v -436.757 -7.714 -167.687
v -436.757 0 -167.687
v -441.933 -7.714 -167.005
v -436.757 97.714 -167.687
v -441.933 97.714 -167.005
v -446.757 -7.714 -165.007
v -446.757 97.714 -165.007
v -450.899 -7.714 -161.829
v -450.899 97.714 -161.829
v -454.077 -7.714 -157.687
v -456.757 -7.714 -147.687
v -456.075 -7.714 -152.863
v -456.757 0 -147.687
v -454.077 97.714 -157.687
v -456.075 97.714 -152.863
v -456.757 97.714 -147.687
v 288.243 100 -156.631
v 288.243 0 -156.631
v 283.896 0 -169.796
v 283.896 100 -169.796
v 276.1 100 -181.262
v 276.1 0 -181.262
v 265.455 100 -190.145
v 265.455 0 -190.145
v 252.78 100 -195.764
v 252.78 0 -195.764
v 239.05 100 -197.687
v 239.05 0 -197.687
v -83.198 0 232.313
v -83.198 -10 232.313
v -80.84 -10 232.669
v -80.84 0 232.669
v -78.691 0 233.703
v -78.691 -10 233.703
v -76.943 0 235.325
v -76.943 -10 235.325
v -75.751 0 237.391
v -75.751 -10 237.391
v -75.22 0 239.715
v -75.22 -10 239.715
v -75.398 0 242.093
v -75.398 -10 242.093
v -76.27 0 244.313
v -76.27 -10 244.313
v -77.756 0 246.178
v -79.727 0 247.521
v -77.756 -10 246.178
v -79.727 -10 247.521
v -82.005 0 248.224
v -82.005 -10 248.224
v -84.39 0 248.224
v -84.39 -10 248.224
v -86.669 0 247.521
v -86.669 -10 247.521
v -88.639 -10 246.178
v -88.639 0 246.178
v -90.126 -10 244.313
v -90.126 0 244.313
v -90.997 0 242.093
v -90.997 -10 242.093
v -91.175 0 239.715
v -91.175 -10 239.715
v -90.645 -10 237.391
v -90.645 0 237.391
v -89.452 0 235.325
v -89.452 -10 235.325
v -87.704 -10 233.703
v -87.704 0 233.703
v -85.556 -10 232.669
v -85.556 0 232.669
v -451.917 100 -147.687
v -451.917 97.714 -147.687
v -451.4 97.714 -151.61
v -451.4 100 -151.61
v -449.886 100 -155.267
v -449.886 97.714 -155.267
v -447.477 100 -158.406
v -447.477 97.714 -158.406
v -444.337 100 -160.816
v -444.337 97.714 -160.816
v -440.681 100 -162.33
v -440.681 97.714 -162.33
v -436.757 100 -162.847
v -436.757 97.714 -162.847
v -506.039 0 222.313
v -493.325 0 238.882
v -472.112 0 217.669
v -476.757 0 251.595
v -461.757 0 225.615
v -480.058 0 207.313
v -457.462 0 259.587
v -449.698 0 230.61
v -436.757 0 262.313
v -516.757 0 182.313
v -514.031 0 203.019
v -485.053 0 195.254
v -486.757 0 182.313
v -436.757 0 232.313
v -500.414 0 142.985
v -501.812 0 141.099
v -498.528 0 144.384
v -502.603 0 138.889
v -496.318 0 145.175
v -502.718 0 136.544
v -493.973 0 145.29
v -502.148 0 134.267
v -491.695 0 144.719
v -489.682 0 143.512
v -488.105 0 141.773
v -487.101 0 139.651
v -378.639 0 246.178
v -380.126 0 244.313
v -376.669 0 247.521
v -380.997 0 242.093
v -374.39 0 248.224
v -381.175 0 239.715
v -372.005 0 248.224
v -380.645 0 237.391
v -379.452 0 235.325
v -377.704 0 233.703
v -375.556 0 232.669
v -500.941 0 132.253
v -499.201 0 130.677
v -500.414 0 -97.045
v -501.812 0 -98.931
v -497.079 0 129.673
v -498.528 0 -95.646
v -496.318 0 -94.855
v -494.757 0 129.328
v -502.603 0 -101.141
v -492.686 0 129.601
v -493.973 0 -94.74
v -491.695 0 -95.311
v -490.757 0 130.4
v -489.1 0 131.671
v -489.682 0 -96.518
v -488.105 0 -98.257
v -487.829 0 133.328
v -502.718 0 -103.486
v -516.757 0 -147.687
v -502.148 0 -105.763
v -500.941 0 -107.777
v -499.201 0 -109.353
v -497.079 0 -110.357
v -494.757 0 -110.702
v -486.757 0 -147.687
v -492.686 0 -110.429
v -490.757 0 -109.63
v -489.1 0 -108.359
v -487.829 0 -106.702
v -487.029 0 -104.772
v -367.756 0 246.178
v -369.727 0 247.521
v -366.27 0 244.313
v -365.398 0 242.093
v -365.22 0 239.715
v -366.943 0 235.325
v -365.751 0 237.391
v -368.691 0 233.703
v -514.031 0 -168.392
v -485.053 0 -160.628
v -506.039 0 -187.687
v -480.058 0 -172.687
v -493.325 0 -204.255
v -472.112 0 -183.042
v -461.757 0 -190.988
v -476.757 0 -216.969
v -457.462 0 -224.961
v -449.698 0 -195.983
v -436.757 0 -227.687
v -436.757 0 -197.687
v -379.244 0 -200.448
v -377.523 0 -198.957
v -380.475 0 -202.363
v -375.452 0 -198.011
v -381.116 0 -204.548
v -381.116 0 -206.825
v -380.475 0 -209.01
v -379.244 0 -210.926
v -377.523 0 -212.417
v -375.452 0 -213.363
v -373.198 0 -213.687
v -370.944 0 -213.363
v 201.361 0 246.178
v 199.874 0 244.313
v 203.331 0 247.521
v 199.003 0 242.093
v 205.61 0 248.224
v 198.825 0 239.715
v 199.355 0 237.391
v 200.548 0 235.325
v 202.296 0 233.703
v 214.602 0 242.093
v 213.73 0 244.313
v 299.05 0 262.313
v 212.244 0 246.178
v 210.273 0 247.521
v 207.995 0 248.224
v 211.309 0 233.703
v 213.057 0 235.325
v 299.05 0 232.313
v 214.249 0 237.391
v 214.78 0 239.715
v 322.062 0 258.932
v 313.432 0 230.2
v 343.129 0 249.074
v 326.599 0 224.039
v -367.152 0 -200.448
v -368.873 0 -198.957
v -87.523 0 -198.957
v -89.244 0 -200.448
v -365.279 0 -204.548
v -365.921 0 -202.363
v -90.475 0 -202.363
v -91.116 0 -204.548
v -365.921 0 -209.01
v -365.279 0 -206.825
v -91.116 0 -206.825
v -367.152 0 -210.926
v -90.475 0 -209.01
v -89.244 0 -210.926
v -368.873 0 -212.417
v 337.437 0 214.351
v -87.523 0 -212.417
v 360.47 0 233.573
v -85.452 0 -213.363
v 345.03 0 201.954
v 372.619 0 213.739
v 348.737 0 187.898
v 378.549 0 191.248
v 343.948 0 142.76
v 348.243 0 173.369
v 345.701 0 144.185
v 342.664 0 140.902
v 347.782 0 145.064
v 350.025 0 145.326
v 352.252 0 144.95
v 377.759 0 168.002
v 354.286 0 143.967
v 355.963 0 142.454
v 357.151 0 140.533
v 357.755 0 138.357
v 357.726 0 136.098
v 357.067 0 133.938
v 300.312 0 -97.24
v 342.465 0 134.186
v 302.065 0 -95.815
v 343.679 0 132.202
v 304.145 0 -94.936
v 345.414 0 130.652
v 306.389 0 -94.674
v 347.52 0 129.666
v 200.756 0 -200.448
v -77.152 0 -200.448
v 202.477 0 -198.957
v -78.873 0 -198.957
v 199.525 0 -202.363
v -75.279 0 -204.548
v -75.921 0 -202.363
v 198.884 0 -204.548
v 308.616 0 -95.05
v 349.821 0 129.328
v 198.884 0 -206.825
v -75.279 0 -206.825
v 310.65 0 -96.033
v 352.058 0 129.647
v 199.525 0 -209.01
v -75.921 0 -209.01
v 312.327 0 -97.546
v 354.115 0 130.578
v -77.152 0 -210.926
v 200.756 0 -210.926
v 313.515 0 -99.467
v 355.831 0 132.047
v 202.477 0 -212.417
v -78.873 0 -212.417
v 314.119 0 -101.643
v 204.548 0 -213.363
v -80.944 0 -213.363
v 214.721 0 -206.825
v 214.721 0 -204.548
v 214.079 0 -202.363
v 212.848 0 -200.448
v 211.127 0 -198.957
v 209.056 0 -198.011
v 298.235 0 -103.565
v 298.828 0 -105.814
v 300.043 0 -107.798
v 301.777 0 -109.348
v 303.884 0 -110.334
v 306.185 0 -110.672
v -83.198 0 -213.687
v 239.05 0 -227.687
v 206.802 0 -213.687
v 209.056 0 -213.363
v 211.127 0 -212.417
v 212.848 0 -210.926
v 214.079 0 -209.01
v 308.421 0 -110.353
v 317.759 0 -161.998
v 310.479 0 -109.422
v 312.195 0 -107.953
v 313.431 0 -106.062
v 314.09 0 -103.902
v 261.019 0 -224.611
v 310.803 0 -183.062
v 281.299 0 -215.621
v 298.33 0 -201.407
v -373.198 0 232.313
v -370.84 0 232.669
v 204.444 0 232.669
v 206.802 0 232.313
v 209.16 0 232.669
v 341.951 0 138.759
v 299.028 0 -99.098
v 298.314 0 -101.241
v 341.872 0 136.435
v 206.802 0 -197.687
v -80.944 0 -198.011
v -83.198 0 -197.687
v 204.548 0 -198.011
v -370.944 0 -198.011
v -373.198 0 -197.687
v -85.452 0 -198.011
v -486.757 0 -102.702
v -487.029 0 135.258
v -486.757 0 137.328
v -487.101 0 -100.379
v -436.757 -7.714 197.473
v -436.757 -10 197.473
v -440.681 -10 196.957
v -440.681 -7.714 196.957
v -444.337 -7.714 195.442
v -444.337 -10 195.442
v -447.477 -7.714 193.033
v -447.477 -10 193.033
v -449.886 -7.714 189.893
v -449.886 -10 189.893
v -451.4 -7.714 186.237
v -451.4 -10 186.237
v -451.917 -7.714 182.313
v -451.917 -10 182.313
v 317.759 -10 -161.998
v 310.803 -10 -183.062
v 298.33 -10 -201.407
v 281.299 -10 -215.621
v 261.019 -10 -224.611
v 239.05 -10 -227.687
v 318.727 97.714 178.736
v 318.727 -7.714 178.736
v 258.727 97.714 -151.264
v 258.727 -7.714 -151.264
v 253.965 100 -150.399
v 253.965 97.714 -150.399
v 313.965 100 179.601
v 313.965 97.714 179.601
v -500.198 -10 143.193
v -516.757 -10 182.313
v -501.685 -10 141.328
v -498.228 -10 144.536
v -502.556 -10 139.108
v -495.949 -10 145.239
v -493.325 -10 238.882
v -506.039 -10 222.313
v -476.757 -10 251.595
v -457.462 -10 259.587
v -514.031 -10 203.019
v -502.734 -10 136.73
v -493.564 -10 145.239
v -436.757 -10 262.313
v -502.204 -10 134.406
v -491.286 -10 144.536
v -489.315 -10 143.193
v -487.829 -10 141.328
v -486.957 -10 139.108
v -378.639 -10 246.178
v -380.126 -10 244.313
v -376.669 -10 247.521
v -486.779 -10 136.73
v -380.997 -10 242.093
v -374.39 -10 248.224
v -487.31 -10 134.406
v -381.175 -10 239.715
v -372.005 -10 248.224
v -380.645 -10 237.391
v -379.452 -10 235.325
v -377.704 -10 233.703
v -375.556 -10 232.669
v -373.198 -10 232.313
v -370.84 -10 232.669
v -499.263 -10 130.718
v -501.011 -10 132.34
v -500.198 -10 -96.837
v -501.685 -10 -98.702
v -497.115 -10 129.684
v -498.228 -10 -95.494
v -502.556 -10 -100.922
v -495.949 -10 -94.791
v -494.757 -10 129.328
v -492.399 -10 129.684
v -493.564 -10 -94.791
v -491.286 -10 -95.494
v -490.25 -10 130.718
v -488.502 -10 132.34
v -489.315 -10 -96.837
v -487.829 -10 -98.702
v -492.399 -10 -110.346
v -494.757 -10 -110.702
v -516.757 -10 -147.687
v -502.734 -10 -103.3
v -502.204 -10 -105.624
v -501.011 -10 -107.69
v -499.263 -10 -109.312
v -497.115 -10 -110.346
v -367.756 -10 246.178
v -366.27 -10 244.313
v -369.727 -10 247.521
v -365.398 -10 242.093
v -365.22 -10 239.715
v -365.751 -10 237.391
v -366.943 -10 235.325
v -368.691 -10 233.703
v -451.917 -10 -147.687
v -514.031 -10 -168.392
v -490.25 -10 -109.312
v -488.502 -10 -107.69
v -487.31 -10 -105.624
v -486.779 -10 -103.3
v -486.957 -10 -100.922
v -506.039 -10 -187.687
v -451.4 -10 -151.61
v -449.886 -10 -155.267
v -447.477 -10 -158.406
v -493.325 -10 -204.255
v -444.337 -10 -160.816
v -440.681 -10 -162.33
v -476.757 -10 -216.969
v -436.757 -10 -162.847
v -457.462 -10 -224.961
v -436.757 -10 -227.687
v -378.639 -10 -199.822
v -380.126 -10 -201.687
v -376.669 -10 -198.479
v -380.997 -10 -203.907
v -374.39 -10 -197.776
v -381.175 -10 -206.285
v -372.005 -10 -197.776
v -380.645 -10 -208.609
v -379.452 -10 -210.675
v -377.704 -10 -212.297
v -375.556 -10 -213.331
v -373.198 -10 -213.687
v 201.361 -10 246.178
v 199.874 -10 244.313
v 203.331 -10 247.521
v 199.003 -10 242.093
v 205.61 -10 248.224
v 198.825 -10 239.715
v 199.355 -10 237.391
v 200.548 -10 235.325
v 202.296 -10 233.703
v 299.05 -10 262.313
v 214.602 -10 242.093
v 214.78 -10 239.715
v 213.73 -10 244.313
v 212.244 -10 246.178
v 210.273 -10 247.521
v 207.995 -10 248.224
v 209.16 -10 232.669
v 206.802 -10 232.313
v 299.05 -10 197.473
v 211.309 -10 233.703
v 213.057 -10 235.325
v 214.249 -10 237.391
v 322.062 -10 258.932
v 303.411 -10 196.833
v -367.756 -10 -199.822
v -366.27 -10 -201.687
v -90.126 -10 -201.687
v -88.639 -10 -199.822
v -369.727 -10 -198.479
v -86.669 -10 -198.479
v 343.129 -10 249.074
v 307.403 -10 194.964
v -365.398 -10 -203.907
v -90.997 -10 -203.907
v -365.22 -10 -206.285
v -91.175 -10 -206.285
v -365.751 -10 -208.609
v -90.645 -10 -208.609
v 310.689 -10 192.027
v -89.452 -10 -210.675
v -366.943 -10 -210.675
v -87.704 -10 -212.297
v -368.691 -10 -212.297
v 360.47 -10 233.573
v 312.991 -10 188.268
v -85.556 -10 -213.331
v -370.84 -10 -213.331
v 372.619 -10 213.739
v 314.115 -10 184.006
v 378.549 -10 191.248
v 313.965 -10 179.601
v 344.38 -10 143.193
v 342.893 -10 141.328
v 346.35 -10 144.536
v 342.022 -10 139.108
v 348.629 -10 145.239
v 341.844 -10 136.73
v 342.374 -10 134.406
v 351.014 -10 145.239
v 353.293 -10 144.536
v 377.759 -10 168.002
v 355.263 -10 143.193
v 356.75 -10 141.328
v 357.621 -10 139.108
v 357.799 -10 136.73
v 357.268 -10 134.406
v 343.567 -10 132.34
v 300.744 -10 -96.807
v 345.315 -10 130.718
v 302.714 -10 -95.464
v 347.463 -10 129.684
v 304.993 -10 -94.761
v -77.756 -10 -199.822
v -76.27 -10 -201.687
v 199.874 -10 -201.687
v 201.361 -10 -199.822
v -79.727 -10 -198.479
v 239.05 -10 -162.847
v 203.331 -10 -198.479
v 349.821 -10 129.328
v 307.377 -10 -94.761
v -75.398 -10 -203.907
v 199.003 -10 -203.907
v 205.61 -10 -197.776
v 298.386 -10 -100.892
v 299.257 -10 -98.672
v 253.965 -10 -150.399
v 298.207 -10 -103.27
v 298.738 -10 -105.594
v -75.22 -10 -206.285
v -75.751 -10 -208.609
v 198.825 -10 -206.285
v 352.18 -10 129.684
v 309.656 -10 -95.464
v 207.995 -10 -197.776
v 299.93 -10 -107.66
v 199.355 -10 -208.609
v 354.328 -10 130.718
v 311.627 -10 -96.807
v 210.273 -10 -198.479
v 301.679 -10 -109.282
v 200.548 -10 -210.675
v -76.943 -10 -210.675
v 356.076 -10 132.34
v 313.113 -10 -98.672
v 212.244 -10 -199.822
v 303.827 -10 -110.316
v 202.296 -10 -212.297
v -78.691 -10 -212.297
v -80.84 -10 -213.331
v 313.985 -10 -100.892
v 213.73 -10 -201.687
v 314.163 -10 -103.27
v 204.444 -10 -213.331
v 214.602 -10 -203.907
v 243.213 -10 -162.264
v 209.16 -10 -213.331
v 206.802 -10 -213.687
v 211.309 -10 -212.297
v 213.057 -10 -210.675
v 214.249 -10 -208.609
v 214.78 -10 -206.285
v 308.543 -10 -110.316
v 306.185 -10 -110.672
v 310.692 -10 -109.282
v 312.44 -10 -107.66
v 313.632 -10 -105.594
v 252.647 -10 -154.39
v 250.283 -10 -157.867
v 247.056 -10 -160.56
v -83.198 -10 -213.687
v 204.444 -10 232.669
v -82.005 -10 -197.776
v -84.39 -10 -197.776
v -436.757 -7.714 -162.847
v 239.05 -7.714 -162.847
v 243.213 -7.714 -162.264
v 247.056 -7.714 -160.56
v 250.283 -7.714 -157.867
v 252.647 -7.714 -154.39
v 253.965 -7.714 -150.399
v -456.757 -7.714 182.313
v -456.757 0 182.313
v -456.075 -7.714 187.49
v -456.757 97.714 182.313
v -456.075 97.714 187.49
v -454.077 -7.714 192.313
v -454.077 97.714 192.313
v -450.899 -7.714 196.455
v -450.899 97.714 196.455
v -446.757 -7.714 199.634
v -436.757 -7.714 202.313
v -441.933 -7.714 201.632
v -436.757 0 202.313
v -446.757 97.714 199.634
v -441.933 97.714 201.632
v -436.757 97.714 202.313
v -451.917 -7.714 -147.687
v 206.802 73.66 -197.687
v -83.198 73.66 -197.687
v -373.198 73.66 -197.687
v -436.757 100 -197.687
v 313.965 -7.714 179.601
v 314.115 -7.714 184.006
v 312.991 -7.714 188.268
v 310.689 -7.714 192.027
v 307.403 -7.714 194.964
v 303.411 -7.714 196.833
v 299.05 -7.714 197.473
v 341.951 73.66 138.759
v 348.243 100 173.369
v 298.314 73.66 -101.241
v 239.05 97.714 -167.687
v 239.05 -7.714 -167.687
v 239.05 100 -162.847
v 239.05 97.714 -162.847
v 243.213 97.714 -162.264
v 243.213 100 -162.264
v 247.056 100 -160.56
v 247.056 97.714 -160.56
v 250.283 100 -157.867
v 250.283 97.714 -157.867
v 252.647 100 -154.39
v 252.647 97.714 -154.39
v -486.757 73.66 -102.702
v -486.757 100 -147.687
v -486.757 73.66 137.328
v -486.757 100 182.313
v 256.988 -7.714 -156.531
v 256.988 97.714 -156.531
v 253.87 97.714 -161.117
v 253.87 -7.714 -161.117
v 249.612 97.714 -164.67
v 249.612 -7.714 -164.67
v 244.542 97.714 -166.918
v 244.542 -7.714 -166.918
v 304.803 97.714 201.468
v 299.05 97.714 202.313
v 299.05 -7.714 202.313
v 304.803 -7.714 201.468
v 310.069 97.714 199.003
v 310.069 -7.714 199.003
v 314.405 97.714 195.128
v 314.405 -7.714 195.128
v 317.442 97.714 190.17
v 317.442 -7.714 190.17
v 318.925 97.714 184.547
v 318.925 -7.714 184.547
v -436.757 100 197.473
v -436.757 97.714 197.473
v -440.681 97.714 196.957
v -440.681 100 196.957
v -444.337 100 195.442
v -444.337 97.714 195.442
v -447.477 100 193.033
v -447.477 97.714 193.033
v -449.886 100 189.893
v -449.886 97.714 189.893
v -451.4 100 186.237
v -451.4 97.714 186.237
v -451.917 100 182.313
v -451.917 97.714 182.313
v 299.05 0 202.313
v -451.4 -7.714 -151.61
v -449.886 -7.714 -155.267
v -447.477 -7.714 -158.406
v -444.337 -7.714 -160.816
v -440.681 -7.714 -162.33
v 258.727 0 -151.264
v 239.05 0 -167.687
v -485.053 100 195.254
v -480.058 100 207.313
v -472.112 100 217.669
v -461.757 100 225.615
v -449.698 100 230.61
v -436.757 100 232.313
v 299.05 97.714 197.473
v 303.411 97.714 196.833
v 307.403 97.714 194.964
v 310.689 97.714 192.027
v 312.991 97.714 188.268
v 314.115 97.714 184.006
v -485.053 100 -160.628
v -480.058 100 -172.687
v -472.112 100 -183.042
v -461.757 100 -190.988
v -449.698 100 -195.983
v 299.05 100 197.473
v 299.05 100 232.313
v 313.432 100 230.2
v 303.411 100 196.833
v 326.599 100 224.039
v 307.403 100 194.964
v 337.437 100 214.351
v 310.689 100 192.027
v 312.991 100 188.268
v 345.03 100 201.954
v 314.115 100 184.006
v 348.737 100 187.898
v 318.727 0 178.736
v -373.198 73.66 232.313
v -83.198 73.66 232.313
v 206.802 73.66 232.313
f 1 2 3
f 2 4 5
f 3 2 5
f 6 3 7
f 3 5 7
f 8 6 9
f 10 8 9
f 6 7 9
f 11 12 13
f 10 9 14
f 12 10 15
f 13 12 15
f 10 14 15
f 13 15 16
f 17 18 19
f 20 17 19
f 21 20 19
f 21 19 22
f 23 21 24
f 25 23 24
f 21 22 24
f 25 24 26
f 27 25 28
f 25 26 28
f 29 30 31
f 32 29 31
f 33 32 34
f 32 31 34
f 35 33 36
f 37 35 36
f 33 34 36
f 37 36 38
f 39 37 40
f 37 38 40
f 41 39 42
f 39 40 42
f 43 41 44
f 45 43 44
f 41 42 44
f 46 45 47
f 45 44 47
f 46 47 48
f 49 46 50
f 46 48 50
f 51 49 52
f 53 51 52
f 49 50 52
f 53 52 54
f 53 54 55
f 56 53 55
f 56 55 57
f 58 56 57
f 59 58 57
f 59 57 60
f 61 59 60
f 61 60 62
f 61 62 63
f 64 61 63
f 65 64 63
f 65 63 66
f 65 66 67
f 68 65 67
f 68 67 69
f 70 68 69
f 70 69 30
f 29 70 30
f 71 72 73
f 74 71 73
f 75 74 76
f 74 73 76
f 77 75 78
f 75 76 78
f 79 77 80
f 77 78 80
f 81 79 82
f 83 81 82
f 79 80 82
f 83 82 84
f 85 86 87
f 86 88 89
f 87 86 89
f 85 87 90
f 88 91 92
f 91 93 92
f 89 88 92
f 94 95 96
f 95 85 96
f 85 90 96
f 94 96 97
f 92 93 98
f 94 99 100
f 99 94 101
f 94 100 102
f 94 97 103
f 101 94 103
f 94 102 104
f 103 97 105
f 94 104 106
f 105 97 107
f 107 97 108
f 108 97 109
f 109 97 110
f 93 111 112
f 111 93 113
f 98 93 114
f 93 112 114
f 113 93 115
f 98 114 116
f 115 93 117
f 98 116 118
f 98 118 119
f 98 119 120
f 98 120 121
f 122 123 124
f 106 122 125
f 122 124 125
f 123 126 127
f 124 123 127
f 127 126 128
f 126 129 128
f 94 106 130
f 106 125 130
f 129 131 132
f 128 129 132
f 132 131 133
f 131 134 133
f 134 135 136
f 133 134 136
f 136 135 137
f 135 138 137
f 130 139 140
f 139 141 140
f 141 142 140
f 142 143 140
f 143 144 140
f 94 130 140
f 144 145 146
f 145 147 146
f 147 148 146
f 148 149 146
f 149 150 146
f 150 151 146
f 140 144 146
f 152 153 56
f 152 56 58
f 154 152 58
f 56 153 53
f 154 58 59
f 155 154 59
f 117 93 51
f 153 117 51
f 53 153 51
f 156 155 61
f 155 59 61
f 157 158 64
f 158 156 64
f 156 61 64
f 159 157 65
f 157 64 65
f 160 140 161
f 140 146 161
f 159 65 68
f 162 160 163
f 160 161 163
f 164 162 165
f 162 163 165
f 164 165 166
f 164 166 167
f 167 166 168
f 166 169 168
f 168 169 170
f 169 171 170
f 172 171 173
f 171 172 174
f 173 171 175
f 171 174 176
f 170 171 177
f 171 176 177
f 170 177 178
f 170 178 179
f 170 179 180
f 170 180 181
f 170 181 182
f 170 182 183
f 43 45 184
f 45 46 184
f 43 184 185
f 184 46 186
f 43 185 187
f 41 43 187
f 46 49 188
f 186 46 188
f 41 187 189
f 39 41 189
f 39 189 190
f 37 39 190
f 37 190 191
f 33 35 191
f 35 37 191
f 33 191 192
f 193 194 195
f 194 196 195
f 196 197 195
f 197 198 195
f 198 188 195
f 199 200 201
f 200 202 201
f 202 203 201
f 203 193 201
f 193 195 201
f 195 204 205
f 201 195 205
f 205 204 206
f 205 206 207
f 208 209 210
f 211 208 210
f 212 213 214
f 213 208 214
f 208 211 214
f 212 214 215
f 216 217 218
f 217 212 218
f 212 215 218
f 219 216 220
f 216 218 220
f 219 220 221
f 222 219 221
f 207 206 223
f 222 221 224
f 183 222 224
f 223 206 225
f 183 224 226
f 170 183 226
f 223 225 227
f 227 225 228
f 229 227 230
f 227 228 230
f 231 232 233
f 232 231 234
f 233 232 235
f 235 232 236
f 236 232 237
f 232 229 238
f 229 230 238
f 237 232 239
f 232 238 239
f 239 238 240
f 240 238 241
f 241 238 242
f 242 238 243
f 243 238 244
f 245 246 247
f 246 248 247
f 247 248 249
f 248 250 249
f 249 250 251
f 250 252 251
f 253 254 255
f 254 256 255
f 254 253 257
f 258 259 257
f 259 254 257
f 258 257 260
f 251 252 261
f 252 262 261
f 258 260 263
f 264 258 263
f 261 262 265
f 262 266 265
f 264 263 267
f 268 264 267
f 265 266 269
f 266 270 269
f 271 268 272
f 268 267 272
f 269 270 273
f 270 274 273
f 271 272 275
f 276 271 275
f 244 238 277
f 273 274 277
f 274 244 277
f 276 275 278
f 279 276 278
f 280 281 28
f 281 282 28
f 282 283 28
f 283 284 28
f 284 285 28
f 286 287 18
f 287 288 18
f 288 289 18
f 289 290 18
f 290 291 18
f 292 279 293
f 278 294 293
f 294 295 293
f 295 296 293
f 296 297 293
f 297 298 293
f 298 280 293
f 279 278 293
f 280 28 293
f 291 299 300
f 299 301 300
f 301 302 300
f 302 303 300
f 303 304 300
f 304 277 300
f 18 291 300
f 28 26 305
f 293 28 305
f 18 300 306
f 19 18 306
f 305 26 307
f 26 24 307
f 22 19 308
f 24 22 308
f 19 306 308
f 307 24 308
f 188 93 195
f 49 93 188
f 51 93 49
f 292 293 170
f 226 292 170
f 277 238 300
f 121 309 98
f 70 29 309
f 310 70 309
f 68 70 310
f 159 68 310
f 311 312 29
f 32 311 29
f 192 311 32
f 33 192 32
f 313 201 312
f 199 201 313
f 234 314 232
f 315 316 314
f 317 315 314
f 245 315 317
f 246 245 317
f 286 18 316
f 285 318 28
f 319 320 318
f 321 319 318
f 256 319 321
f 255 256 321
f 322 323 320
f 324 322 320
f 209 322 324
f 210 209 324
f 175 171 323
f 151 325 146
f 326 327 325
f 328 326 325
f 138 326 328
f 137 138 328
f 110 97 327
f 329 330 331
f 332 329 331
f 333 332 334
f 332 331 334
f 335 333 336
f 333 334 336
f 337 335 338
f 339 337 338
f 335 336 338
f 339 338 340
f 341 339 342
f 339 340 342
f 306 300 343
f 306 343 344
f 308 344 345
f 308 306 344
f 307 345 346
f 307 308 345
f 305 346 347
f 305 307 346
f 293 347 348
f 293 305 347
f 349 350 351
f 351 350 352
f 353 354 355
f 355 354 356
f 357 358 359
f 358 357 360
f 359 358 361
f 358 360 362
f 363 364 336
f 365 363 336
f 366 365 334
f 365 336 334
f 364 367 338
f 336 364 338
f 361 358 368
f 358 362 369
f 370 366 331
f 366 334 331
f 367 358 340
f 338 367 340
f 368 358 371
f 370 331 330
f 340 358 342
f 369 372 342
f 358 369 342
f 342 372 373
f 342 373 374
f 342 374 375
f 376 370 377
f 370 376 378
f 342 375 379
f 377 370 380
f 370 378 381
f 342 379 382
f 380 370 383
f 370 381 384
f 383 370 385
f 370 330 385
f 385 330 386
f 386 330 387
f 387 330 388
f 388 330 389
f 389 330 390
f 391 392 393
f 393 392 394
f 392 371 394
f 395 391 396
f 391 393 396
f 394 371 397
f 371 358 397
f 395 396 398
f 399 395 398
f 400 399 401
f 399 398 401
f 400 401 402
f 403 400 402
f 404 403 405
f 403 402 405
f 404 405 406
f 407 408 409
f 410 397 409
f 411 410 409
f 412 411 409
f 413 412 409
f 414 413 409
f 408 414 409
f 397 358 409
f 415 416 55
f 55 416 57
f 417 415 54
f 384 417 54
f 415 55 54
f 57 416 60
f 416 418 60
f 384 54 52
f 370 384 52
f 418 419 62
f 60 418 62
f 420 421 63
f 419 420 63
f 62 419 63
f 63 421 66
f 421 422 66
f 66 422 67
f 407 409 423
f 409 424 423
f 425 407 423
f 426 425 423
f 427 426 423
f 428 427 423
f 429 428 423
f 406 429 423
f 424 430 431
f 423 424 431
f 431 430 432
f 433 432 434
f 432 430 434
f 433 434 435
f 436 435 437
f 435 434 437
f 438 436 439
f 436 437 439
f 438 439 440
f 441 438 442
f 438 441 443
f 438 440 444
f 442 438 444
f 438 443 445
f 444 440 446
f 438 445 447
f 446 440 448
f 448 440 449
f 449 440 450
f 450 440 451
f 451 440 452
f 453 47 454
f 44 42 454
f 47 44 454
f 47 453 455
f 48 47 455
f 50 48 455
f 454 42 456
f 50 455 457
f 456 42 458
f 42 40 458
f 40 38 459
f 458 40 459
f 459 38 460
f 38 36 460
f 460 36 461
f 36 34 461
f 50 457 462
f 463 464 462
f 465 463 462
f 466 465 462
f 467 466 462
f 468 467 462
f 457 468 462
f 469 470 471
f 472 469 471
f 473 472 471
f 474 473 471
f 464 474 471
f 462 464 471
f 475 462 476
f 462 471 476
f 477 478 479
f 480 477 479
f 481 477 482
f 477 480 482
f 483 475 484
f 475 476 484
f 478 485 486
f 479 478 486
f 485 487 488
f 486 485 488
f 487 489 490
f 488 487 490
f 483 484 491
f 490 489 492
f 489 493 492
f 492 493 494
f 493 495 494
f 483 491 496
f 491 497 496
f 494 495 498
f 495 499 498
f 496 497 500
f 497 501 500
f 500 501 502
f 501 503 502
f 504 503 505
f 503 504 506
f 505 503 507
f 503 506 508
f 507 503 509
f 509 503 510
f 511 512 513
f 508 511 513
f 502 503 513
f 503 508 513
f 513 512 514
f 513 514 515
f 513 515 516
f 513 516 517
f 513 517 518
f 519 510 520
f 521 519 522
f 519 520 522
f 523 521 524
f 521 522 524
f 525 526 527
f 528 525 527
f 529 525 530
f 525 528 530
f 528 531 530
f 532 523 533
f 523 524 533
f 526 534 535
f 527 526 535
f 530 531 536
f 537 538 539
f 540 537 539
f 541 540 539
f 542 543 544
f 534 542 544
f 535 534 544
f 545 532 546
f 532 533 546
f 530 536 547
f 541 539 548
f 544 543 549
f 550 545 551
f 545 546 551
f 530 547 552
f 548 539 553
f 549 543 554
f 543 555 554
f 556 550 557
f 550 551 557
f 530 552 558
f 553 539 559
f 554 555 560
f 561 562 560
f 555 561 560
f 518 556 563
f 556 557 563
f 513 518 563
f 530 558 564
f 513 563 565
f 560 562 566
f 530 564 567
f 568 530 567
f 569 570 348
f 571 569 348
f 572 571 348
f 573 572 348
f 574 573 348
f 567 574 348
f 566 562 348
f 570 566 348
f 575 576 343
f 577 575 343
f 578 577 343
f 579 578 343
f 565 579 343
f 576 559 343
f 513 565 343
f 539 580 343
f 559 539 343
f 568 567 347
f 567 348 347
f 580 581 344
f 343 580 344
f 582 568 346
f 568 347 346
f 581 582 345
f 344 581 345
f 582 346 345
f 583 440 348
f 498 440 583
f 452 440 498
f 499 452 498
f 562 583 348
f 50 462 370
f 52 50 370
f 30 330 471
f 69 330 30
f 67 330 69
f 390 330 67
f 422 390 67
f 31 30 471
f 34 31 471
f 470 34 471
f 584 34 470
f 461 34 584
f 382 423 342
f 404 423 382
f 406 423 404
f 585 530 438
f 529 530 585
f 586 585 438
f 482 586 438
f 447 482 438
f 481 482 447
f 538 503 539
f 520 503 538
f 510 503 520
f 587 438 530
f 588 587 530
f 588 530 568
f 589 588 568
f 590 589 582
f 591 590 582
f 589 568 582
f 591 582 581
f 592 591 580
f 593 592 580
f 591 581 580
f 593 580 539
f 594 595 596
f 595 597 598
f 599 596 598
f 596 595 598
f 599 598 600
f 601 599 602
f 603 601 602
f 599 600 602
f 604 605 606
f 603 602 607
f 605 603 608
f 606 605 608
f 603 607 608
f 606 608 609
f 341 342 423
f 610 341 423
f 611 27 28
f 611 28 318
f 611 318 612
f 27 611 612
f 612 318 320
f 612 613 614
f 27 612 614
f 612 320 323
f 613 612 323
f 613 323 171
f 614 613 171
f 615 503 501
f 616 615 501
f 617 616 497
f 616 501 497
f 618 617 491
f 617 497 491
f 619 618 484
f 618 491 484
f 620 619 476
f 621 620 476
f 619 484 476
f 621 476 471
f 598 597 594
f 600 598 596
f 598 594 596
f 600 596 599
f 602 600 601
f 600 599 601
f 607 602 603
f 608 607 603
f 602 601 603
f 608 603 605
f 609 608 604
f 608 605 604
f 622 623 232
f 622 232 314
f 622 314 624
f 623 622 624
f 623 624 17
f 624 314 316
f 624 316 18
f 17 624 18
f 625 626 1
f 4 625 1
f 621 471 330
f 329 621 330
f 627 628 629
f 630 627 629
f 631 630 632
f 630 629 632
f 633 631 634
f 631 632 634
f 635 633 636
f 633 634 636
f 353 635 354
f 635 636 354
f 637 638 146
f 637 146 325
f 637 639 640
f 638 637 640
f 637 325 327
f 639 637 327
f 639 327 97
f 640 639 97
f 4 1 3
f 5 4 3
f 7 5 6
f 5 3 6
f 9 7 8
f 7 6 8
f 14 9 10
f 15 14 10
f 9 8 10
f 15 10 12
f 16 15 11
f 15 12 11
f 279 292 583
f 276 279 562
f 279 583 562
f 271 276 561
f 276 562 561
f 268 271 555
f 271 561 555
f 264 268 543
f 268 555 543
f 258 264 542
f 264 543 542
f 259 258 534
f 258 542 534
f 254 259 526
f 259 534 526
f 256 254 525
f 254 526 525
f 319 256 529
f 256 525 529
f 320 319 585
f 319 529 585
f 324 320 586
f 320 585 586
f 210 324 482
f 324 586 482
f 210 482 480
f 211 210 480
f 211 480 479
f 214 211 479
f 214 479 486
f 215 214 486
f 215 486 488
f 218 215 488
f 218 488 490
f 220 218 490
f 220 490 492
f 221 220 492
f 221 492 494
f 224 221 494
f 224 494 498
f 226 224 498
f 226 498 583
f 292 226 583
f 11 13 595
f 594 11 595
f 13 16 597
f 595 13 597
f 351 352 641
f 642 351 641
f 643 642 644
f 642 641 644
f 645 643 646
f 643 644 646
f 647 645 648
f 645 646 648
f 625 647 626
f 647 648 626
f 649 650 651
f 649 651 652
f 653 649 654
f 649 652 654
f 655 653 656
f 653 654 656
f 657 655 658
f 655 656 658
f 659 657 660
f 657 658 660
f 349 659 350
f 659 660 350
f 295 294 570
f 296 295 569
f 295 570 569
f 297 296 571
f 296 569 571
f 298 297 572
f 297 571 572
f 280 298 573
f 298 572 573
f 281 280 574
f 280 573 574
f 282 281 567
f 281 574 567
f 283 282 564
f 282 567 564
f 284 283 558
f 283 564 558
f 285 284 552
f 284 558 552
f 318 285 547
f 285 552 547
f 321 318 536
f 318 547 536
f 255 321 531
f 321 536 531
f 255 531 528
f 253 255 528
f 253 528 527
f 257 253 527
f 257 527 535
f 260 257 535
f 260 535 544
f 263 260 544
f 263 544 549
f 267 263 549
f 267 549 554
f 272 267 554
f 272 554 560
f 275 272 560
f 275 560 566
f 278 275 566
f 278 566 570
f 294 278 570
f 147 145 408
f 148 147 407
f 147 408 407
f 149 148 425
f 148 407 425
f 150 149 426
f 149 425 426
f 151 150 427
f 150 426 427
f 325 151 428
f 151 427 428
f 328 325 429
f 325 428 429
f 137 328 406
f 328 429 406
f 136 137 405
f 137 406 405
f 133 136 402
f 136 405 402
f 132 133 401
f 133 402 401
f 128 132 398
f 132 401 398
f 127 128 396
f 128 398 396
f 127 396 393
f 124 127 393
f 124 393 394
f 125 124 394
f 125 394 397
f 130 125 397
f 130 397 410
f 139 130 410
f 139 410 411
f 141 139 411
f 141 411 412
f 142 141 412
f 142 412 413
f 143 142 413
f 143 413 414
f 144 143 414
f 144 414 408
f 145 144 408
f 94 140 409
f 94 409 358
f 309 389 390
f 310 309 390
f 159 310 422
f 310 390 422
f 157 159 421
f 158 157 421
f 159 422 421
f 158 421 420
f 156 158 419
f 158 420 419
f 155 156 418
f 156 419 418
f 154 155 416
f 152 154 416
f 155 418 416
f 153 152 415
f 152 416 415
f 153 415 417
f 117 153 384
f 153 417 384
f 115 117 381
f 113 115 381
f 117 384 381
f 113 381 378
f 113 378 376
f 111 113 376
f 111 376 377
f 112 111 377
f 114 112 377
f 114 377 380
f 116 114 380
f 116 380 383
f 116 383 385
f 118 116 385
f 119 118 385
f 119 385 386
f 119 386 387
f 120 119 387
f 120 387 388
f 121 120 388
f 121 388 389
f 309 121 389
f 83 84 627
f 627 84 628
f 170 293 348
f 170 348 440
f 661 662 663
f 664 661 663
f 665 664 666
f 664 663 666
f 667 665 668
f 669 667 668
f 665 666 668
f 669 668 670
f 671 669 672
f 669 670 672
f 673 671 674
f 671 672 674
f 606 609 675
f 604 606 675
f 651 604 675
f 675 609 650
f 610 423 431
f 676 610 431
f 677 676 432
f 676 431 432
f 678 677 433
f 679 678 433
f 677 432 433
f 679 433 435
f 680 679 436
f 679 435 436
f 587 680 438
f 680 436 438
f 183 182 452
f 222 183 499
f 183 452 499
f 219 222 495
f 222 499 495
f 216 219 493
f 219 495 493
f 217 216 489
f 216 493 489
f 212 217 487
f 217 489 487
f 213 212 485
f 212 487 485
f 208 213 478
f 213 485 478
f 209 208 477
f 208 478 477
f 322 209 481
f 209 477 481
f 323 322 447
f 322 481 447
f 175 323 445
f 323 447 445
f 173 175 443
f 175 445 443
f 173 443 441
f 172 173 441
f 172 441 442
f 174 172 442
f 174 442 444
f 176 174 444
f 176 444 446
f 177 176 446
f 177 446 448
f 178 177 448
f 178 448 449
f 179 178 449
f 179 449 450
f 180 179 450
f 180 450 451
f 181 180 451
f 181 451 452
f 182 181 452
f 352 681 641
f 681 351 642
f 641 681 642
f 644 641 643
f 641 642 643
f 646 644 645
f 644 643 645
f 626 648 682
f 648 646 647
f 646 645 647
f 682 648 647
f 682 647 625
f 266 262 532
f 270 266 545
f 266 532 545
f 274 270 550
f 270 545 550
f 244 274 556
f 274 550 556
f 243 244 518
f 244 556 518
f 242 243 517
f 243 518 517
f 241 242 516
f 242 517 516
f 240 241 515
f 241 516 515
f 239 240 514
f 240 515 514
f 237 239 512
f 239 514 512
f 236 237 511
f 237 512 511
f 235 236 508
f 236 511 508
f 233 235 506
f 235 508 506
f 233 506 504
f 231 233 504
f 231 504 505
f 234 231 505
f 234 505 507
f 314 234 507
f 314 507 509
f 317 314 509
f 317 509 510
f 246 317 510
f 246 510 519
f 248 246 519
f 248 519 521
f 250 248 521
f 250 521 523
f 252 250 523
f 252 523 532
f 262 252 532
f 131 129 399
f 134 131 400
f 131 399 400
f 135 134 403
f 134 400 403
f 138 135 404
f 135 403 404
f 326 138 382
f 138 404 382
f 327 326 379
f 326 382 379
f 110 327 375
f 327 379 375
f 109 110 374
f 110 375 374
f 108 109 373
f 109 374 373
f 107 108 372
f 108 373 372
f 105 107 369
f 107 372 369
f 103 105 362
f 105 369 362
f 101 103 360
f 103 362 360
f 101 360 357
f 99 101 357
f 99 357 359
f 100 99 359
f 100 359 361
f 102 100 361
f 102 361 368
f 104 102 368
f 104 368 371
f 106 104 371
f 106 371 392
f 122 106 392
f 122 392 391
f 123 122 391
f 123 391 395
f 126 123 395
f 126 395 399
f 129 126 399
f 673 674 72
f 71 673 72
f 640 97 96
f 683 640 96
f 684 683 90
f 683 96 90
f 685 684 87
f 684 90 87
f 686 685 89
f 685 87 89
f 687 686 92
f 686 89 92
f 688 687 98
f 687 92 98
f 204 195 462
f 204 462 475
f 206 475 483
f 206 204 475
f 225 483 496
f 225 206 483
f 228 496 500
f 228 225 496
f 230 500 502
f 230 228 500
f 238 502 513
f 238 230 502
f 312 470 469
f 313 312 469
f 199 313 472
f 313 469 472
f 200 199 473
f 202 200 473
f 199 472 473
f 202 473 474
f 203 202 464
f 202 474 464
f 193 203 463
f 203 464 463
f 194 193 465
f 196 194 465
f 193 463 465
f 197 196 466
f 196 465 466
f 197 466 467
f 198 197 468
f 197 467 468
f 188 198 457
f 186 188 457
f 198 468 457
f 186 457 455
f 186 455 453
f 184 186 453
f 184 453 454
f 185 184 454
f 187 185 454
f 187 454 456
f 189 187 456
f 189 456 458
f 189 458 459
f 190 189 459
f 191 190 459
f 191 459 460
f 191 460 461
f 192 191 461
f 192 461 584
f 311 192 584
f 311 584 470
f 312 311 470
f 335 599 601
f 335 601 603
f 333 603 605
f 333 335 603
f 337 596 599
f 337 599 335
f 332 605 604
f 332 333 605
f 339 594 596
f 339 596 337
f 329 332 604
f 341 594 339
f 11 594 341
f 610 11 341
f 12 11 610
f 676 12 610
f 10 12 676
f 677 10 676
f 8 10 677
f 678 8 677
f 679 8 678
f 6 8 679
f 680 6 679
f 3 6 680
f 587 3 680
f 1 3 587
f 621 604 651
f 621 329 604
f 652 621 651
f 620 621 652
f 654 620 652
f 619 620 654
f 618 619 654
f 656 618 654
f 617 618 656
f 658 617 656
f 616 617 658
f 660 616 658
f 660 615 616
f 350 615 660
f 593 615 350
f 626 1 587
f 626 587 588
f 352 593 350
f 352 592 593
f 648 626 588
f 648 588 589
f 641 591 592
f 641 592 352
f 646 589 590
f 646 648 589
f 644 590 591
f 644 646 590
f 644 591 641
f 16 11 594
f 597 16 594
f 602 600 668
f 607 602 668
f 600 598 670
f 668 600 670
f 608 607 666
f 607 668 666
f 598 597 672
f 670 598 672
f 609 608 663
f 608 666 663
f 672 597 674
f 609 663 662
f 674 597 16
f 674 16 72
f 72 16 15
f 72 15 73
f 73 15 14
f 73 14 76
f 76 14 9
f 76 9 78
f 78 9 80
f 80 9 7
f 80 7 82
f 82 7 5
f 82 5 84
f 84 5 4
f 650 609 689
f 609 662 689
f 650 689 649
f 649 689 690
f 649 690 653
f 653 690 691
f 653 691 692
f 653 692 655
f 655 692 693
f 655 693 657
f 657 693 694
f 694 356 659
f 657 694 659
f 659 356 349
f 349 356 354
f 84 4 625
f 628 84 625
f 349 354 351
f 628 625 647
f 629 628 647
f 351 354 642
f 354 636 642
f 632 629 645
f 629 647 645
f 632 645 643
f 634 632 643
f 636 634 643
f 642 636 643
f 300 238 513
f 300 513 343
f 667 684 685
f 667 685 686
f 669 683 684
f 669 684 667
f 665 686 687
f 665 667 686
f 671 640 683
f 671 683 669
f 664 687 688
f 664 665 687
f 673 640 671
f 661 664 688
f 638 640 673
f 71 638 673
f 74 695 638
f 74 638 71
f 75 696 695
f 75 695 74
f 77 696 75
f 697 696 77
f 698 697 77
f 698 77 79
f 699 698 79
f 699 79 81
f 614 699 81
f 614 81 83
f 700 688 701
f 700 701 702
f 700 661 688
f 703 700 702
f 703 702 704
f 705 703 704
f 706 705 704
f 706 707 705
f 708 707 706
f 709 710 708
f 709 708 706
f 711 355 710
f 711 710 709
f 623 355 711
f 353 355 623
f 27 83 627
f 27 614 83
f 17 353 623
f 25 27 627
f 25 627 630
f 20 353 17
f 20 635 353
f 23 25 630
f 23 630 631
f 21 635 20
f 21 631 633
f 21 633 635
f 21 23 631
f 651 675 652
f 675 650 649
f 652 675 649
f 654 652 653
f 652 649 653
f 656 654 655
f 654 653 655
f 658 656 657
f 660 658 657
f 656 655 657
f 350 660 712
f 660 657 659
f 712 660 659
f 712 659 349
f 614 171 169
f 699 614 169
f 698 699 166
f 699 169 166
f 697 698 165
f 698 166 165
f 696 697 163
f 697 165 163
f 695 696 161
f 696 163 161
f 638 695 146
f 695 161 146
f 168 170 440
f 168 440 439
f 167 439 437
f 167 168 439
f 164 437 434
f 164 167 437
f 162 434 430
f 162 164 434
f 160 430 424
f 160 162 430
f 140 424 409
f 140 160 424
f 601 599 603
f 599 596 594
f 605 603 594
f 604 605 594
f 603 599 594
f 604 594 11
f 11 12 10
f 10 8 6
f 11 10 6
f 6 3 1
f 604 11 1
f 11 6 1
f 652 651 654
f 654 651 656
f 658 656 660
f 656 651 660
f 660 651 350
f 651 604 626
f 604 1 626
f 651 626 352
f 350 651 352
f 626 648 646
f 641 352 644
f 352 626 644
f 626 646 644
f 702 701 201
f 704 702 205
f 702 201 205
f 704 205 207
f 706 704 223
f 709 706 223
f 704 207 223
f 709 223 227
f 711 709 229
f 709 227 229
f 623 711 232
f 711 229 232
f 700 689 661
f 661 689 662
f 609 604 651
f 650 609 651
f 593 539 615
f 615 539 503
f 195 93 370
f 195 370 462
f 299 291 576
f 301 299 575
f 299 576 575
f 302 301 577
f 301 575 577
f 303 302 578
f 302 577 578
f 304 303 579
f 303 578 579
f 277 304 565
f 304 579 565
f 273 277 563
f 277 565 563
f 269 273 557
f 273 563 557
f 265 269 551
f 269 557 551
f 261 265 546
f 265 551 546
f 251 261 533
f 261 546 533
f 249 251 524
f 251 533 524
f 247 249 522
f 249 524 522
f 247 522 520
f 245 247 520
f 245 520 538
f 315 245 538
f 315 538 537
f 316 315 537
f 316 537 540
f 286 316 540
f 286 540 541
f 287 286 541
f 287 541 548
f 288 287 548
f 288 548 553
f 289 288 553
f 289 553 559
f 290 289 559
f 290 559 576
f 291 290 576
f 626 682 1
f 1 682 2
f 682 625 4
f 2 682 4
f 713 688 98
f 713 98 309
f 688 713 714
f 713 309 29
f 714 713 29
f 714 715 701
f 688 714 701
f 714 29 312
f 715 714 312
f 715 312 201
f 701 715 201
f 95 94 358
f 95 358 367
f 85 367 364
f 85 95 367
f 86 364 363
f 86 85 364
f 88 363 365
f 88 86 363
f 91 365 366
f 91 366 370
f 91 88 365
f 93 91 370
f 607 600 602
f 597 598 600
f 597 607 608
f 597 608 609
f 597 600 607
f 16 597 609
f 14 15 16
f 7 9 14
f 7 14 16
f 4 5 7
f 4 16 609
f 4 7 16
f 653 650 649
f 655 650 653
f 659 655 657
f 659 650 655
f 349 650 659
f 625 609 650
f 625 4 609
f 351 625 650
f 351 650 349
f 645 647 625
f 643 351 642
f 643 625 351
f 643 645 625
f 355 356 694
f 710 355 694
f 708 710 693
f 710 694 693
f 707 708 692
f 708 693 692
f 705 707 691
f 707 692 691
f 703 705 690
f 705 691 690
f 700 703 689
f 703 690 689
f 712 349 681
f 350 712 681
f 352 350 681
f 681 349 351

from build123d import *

# Parameters (mm, degrees)
SURFACE_EXTRUDE1_1_DEPTH = 100
THICKEN1_T1              = 30
SURFACE_EXTRUDE5_2_DEPTH = 10.000000066
THICKEN4_T1              = 29.999999944
THICKEN4_T2              = 29.999999944
SKETCH10_R               = 8
CUT_EXTRUDE1_DEPTH       = 83.660000066
THICKEN7_START           = 97.714
THICKEN7_DEPTH           = 2.286
THICKEN8_START           = -10.000000066
THICKEN8_DEPTH           = 2.286
THICKEN9_START           = -7.713999964
THICKEN9_DEPTH           = 105.427999964


# Read off the part's stored shape, not the designer's step: Thicken7, Thicken8, Thicken9
with BuildPart() as body_1:
    # Surface-Extrude1: a surface, the sketch's curves swept straight by 100 mm
    with BuildLine(Plane(origin=(0, 0, 0), x_dir=(1, 0, 0), z_dir=(0, 1, 0)), mode=Mode.PRIVATE) as surface_extrude1_1_path:
        Line((-486.756814761, 147.686739346), (-486.756814761, -182.313260654))
        ThreePointArc((-486.756814761, -182.313260654), (-472.112153821, -217.668599714), (-436.756814761, -232.313260654))
        Line((-436.756814761, -232.313260654), (299.049689734, -232.313260654))
        ThreePointArc((299.049689734, -232.313260654), (337.43727624, -214.350632617), (348.243185239, -173.368988744))
        Line((348.243185239, -173.368988744), (288.243185239, 156.631011256))
        ThreePointArc((288.243185239, 156.631011256), (271.087061696, 186.074325852), (239.049689734, 197.686739346))
        Line((239.049689734, 197.686739346), (-436.756814761, 197.686739346))
        ThreePointArc((-436.756814761, 197.686739346), (-472.112153821, 183.042078405), (-486.756814761, 147.686739346))
    surface_extrude1_1 = Shell.extrude(surface_extrude1_1_path.wire(), (0 * SURFACE_EXTRUDE1_1_DEPTH, 1 * SURFACE_EXTRUDE1_1_DEPTH, 0 * SURFACE_EXTRUDE1_1_DEPTH))
    add(Solid.thicken(surface_extrude1_1, THICKEN1_T1))

    # Surface-Extrude5: a surface, the sketch's curves swept straight by 10.000000066 mm
    with BuildLine(Plane.XZ, mode=Mode.PRIVATE) as surface_extrude5_2_path:
        Line((-436.756814761, 232.313260654), (299.049689734, 232.313260654))
        ThreePointArc((299.049689734, 232.313260654), (337.43727624, 214.350632617), (348.243185239, 173.368988744))
        Line((348.243185239, 173.368988744), (288.243185239, -156.631011256))
        ThreePointArc((288.243185239, -156.631011256), (271.087061696, -186.074325852), (239.049689734, -197.686739346))
        Line((239.049689734, -197.686739346), (-436.756814761, -197.686739346))
        ThreePointArc((-436.756814761, -197.686739346), (-472.112153821, -183.042078405), (-486.756814761, -147.686739346))
        Line((-486.756814761, -147.686739346), (-486.756814761, 182.313260654))
        ThreePointArc((-486.756814761, 182.313260654), (-472.112153821, 217.668599714), (-436.756814761, 232.313260654))
    surface_extrude5_2 = Shell.extrude(surface_extrude5_2_path.wire(), (0 * SURFACE_EXTRUDE5_2_DEPTH, -1 * SURFACE_EXTRUDE5_2_DEPTH, 0 * SURFACE_EXTRUDE5_2_DEPTH))
    add(Solid.thicken(surface_extrude5_2, THICKEN4_T1))
    add(Solid.thicken(surface_extrude5_2, -THICKEN4_T2))

    # Sketch10 → Cut-Extrude1 (cut)
    with BuildSketch(Plane.XZ.offset(10.000000066)):
        with Locations(Location((206.802218777, -205.686739346, 0), (0, 0, 270))):
            Circle(SKETCH10_R)
        with Locations(Location((-83.197781105, -205.686739346, 0), (0, 0, 270))):
            Circle(SKETCH10_R)
        with Locations(Location((-373.197780987, -205.686739346, 0), (0, 0, 270))):
            Circle(SKETCH10_R)
        with Locations(Location((-494.756814761, -102.701739346, 0), (0, 0, 270))):
            Circle(SKETCH10_R)
        with Locations(Location((-494.756814761, 137.328260654, 0), (0, 0, 270))):
            Circle(SKETCH10_R)
        with Locations(Location((306.185118221, -102.671739406, 0), (0, 0, 270))):
            Circle(SKETCH10_R)
        with Locations(Location((349.821481868, 137.328260654, 0), (0, 0, 270))):
            Circle(SKETCH10_R)
        with Locations(Location((-83.197781105, 240.313260654, 0), (0, 0, 270))):
            Circle(SKETCH10_R)
        with Locations(Location((-373.197780987, 240.313260654, 0), (0, 0, 270))):
            Circle(SKETCH10_R)
        with Locations(Location((206.802218777, 240.313260654, 0), (0, 0, 270))):
            Circle(SKETCH10_R)
    extrude(amount=-CUT_EXTRUDE1_DEPTH, mode=Mode.SUBTRACT)

    # Thicken7 outline → Thicken7 (add)
    with BuildSketch(Plane(origin=(0, 0, 0), x_dir=(1, 0, 0), z_dir=(0, 1, 0)).offset(THICKEN7_START)):
        with BuildLine():
            Line((-436.756814761, -202.313260654), (299.049689734, -202.313260654))
            ThreePointArc((299.049689734, -202.313260654), (314.404724336, -195.128209439), (318.727087936, -178.73555189))
            Line((318.727087936, -178.73555189), (258.727087936, 151.26444811))
            ThreePointArc((258.727087936, 151.26444811), (251.864638519, 163.041773948), (239.049689734, 167.686739346))
            Line((239.049689734, 167.686739346), (-436.756814761, 167.686739346))
            ThreePointArc((-436.756814761, 167.686739346), (-450.898950384, 161.828874969), (-456.756814761, 147.686739346))
            Line((-456.756814761, 147.686739346), (-456.756814761, -182.313260654))
            ThreePointArc((-456.756814761, -182.313260654), (-450.898950385, -196.455396278), (-436.756814761, -202.313260654))
        make_face()
        with BuildLine():
            Line((299.049689734, -197.473260654), (-436.756814761, -197.473260654))
            ThreePointArc((-436.756814761, -197.473260654), (-447.476553564, -193.032999457), (-451.916814761, -182.313260654))
            Line((-451.916814761, -182.313260654), (-451.916814761, 147.686739346))
            ThreePointArc((-451.916814761, 147.686739346), (-447.476553564, 158.406478149), (-436.756814761, 162.846739346))
            Line((-436.756814761, 162.846739346), (239.049689734, 162.846739346))
            ThreePointArc((239.049689734, 162.846739346), (248.763420913, 159.325855574), (253.965157571, 150.398642589))
            Line((253.965157571, 150.398642589), (313.965157571, -179.601357411))
            ThreePointArc((313.965157571, -179.601357411), (310.688805962, -192.026991833), (299.049689734, -197.473260654))
        make_face(mode=Mode.SUBTRACT)
    extrude(amount=THICKEN7_DEPTH)

    # Thicken8 outline → Thicken8 (add)
    with BuildSketch(Plane(origin=(0, 0, 0), x_dir=(1, 0, 0), z_dir=(0, 1, 0)).offset(THICKEN8_START)):
        with BuildLine():
            Line((-436.756814761, -202.313260654), (299.049689734, -202.313260654))
            ThreePointArc((299.049689734, -202.313260654), (314.404724336, -195.128209439), (318.727087936, -178.73555189))
            Line((318.727087936, -178.73555189), (258.727087936, 151.26444811))
            ThreePointArc((258.727087936, 151.26444811), (251.864638519, 163.041773948), (239.049689734, 167.686739346))
            Line((239.049689734, 167.686739346), (-436.756814761, 167.686739346))
            ThreePointArc((-436.756814761, 167.686739346), (-450.898950384, 161.828874969), (-456.756814761, 147.686739346))
            Line((-456.756814761, 147.686739346), (-456.756814761, -182.313260654))
            ThreePointArc((-456.756814761, -182.313260654), (-450.898950385, -196.455396278), (-436.756814761, -202.313260654))
        make_face()
        with BuildLine():
            ThreePointArc((-436.756814761, -197.473260738), (-447.476553623, -193.032999517), (-451.916814845, -182.313260654))
            Line((-451.916814845, -182.313260654), (-451.916814845, 147.686739346))
            ThreePointArc((-451.916814845, 147.686739346), (-447.476553623, 158.406478208), (-436.756814761, 162.84673943))
            Line((-436.756814761, 162.84673943), (239.049689734, 162.84673943))
            ThreePointArc((239.049689734, 162.84673943), (248.763420967, 159.325855639), (253.965157654, 150.398642604))
            Line((253.965157654, 150.398642604), (313.965157654, -179.601357396))
            ThreePointArc((313.965157654, -179.601357396), (310.688806027, -192.026991887), (299.049689734, -197.473260738))
            Line((299.049689734, -197.473260738), (-436.756814761, -197.473260738))
        make_face(mode=Mode.SUBTRACT)
    extrude(amount=THICKEN8_DEPTH)


with BuildPart() as body_2:
    # Thicken9 outline → Thicken9 (new body)
    with BuildSketch(Plane(origin=(0, 0, 0), x_dir=(1, 0, 0), z_dir=(0, 1, 0)).offset(THICKEN9_START)):
        with BuildLine():
            ThreePointArc((258.727087936, 151.26444811), (251.864638519, 163.041773948), (239.049689734, 167.686739346))
            Line((239.049689734, 167.686739346), (-436.756814761, 167.686739346))
            ThreePointArc((-436.756814761, 167.686739346), (-450.898950384, 161.828874969), (-456.756814761, 147.686739346))
            Line((-456.756814761, 147.686739346), (-456.756814761, -182.313260654))
            ThreePointArc((-456.756814761, -182.313260654), (-450.898950385, -196.455396278), (-436.756814761, -202.313260654))
            Line((-436.756814761, -202.313260654), (299.049689734, -202.313260654))
            ThreePointArc((299.049689734, -202.313260654), (314.404724336, -195.128209439), (318.727087936, -178.73555189))
            Line((318.727087936, -178.73555189), (258.727087936, 151.26444811))
        make_face()
    extrude(amount=THICKEN9_DEPTH)


solid = Compound([body_1.part, body_2.part])
